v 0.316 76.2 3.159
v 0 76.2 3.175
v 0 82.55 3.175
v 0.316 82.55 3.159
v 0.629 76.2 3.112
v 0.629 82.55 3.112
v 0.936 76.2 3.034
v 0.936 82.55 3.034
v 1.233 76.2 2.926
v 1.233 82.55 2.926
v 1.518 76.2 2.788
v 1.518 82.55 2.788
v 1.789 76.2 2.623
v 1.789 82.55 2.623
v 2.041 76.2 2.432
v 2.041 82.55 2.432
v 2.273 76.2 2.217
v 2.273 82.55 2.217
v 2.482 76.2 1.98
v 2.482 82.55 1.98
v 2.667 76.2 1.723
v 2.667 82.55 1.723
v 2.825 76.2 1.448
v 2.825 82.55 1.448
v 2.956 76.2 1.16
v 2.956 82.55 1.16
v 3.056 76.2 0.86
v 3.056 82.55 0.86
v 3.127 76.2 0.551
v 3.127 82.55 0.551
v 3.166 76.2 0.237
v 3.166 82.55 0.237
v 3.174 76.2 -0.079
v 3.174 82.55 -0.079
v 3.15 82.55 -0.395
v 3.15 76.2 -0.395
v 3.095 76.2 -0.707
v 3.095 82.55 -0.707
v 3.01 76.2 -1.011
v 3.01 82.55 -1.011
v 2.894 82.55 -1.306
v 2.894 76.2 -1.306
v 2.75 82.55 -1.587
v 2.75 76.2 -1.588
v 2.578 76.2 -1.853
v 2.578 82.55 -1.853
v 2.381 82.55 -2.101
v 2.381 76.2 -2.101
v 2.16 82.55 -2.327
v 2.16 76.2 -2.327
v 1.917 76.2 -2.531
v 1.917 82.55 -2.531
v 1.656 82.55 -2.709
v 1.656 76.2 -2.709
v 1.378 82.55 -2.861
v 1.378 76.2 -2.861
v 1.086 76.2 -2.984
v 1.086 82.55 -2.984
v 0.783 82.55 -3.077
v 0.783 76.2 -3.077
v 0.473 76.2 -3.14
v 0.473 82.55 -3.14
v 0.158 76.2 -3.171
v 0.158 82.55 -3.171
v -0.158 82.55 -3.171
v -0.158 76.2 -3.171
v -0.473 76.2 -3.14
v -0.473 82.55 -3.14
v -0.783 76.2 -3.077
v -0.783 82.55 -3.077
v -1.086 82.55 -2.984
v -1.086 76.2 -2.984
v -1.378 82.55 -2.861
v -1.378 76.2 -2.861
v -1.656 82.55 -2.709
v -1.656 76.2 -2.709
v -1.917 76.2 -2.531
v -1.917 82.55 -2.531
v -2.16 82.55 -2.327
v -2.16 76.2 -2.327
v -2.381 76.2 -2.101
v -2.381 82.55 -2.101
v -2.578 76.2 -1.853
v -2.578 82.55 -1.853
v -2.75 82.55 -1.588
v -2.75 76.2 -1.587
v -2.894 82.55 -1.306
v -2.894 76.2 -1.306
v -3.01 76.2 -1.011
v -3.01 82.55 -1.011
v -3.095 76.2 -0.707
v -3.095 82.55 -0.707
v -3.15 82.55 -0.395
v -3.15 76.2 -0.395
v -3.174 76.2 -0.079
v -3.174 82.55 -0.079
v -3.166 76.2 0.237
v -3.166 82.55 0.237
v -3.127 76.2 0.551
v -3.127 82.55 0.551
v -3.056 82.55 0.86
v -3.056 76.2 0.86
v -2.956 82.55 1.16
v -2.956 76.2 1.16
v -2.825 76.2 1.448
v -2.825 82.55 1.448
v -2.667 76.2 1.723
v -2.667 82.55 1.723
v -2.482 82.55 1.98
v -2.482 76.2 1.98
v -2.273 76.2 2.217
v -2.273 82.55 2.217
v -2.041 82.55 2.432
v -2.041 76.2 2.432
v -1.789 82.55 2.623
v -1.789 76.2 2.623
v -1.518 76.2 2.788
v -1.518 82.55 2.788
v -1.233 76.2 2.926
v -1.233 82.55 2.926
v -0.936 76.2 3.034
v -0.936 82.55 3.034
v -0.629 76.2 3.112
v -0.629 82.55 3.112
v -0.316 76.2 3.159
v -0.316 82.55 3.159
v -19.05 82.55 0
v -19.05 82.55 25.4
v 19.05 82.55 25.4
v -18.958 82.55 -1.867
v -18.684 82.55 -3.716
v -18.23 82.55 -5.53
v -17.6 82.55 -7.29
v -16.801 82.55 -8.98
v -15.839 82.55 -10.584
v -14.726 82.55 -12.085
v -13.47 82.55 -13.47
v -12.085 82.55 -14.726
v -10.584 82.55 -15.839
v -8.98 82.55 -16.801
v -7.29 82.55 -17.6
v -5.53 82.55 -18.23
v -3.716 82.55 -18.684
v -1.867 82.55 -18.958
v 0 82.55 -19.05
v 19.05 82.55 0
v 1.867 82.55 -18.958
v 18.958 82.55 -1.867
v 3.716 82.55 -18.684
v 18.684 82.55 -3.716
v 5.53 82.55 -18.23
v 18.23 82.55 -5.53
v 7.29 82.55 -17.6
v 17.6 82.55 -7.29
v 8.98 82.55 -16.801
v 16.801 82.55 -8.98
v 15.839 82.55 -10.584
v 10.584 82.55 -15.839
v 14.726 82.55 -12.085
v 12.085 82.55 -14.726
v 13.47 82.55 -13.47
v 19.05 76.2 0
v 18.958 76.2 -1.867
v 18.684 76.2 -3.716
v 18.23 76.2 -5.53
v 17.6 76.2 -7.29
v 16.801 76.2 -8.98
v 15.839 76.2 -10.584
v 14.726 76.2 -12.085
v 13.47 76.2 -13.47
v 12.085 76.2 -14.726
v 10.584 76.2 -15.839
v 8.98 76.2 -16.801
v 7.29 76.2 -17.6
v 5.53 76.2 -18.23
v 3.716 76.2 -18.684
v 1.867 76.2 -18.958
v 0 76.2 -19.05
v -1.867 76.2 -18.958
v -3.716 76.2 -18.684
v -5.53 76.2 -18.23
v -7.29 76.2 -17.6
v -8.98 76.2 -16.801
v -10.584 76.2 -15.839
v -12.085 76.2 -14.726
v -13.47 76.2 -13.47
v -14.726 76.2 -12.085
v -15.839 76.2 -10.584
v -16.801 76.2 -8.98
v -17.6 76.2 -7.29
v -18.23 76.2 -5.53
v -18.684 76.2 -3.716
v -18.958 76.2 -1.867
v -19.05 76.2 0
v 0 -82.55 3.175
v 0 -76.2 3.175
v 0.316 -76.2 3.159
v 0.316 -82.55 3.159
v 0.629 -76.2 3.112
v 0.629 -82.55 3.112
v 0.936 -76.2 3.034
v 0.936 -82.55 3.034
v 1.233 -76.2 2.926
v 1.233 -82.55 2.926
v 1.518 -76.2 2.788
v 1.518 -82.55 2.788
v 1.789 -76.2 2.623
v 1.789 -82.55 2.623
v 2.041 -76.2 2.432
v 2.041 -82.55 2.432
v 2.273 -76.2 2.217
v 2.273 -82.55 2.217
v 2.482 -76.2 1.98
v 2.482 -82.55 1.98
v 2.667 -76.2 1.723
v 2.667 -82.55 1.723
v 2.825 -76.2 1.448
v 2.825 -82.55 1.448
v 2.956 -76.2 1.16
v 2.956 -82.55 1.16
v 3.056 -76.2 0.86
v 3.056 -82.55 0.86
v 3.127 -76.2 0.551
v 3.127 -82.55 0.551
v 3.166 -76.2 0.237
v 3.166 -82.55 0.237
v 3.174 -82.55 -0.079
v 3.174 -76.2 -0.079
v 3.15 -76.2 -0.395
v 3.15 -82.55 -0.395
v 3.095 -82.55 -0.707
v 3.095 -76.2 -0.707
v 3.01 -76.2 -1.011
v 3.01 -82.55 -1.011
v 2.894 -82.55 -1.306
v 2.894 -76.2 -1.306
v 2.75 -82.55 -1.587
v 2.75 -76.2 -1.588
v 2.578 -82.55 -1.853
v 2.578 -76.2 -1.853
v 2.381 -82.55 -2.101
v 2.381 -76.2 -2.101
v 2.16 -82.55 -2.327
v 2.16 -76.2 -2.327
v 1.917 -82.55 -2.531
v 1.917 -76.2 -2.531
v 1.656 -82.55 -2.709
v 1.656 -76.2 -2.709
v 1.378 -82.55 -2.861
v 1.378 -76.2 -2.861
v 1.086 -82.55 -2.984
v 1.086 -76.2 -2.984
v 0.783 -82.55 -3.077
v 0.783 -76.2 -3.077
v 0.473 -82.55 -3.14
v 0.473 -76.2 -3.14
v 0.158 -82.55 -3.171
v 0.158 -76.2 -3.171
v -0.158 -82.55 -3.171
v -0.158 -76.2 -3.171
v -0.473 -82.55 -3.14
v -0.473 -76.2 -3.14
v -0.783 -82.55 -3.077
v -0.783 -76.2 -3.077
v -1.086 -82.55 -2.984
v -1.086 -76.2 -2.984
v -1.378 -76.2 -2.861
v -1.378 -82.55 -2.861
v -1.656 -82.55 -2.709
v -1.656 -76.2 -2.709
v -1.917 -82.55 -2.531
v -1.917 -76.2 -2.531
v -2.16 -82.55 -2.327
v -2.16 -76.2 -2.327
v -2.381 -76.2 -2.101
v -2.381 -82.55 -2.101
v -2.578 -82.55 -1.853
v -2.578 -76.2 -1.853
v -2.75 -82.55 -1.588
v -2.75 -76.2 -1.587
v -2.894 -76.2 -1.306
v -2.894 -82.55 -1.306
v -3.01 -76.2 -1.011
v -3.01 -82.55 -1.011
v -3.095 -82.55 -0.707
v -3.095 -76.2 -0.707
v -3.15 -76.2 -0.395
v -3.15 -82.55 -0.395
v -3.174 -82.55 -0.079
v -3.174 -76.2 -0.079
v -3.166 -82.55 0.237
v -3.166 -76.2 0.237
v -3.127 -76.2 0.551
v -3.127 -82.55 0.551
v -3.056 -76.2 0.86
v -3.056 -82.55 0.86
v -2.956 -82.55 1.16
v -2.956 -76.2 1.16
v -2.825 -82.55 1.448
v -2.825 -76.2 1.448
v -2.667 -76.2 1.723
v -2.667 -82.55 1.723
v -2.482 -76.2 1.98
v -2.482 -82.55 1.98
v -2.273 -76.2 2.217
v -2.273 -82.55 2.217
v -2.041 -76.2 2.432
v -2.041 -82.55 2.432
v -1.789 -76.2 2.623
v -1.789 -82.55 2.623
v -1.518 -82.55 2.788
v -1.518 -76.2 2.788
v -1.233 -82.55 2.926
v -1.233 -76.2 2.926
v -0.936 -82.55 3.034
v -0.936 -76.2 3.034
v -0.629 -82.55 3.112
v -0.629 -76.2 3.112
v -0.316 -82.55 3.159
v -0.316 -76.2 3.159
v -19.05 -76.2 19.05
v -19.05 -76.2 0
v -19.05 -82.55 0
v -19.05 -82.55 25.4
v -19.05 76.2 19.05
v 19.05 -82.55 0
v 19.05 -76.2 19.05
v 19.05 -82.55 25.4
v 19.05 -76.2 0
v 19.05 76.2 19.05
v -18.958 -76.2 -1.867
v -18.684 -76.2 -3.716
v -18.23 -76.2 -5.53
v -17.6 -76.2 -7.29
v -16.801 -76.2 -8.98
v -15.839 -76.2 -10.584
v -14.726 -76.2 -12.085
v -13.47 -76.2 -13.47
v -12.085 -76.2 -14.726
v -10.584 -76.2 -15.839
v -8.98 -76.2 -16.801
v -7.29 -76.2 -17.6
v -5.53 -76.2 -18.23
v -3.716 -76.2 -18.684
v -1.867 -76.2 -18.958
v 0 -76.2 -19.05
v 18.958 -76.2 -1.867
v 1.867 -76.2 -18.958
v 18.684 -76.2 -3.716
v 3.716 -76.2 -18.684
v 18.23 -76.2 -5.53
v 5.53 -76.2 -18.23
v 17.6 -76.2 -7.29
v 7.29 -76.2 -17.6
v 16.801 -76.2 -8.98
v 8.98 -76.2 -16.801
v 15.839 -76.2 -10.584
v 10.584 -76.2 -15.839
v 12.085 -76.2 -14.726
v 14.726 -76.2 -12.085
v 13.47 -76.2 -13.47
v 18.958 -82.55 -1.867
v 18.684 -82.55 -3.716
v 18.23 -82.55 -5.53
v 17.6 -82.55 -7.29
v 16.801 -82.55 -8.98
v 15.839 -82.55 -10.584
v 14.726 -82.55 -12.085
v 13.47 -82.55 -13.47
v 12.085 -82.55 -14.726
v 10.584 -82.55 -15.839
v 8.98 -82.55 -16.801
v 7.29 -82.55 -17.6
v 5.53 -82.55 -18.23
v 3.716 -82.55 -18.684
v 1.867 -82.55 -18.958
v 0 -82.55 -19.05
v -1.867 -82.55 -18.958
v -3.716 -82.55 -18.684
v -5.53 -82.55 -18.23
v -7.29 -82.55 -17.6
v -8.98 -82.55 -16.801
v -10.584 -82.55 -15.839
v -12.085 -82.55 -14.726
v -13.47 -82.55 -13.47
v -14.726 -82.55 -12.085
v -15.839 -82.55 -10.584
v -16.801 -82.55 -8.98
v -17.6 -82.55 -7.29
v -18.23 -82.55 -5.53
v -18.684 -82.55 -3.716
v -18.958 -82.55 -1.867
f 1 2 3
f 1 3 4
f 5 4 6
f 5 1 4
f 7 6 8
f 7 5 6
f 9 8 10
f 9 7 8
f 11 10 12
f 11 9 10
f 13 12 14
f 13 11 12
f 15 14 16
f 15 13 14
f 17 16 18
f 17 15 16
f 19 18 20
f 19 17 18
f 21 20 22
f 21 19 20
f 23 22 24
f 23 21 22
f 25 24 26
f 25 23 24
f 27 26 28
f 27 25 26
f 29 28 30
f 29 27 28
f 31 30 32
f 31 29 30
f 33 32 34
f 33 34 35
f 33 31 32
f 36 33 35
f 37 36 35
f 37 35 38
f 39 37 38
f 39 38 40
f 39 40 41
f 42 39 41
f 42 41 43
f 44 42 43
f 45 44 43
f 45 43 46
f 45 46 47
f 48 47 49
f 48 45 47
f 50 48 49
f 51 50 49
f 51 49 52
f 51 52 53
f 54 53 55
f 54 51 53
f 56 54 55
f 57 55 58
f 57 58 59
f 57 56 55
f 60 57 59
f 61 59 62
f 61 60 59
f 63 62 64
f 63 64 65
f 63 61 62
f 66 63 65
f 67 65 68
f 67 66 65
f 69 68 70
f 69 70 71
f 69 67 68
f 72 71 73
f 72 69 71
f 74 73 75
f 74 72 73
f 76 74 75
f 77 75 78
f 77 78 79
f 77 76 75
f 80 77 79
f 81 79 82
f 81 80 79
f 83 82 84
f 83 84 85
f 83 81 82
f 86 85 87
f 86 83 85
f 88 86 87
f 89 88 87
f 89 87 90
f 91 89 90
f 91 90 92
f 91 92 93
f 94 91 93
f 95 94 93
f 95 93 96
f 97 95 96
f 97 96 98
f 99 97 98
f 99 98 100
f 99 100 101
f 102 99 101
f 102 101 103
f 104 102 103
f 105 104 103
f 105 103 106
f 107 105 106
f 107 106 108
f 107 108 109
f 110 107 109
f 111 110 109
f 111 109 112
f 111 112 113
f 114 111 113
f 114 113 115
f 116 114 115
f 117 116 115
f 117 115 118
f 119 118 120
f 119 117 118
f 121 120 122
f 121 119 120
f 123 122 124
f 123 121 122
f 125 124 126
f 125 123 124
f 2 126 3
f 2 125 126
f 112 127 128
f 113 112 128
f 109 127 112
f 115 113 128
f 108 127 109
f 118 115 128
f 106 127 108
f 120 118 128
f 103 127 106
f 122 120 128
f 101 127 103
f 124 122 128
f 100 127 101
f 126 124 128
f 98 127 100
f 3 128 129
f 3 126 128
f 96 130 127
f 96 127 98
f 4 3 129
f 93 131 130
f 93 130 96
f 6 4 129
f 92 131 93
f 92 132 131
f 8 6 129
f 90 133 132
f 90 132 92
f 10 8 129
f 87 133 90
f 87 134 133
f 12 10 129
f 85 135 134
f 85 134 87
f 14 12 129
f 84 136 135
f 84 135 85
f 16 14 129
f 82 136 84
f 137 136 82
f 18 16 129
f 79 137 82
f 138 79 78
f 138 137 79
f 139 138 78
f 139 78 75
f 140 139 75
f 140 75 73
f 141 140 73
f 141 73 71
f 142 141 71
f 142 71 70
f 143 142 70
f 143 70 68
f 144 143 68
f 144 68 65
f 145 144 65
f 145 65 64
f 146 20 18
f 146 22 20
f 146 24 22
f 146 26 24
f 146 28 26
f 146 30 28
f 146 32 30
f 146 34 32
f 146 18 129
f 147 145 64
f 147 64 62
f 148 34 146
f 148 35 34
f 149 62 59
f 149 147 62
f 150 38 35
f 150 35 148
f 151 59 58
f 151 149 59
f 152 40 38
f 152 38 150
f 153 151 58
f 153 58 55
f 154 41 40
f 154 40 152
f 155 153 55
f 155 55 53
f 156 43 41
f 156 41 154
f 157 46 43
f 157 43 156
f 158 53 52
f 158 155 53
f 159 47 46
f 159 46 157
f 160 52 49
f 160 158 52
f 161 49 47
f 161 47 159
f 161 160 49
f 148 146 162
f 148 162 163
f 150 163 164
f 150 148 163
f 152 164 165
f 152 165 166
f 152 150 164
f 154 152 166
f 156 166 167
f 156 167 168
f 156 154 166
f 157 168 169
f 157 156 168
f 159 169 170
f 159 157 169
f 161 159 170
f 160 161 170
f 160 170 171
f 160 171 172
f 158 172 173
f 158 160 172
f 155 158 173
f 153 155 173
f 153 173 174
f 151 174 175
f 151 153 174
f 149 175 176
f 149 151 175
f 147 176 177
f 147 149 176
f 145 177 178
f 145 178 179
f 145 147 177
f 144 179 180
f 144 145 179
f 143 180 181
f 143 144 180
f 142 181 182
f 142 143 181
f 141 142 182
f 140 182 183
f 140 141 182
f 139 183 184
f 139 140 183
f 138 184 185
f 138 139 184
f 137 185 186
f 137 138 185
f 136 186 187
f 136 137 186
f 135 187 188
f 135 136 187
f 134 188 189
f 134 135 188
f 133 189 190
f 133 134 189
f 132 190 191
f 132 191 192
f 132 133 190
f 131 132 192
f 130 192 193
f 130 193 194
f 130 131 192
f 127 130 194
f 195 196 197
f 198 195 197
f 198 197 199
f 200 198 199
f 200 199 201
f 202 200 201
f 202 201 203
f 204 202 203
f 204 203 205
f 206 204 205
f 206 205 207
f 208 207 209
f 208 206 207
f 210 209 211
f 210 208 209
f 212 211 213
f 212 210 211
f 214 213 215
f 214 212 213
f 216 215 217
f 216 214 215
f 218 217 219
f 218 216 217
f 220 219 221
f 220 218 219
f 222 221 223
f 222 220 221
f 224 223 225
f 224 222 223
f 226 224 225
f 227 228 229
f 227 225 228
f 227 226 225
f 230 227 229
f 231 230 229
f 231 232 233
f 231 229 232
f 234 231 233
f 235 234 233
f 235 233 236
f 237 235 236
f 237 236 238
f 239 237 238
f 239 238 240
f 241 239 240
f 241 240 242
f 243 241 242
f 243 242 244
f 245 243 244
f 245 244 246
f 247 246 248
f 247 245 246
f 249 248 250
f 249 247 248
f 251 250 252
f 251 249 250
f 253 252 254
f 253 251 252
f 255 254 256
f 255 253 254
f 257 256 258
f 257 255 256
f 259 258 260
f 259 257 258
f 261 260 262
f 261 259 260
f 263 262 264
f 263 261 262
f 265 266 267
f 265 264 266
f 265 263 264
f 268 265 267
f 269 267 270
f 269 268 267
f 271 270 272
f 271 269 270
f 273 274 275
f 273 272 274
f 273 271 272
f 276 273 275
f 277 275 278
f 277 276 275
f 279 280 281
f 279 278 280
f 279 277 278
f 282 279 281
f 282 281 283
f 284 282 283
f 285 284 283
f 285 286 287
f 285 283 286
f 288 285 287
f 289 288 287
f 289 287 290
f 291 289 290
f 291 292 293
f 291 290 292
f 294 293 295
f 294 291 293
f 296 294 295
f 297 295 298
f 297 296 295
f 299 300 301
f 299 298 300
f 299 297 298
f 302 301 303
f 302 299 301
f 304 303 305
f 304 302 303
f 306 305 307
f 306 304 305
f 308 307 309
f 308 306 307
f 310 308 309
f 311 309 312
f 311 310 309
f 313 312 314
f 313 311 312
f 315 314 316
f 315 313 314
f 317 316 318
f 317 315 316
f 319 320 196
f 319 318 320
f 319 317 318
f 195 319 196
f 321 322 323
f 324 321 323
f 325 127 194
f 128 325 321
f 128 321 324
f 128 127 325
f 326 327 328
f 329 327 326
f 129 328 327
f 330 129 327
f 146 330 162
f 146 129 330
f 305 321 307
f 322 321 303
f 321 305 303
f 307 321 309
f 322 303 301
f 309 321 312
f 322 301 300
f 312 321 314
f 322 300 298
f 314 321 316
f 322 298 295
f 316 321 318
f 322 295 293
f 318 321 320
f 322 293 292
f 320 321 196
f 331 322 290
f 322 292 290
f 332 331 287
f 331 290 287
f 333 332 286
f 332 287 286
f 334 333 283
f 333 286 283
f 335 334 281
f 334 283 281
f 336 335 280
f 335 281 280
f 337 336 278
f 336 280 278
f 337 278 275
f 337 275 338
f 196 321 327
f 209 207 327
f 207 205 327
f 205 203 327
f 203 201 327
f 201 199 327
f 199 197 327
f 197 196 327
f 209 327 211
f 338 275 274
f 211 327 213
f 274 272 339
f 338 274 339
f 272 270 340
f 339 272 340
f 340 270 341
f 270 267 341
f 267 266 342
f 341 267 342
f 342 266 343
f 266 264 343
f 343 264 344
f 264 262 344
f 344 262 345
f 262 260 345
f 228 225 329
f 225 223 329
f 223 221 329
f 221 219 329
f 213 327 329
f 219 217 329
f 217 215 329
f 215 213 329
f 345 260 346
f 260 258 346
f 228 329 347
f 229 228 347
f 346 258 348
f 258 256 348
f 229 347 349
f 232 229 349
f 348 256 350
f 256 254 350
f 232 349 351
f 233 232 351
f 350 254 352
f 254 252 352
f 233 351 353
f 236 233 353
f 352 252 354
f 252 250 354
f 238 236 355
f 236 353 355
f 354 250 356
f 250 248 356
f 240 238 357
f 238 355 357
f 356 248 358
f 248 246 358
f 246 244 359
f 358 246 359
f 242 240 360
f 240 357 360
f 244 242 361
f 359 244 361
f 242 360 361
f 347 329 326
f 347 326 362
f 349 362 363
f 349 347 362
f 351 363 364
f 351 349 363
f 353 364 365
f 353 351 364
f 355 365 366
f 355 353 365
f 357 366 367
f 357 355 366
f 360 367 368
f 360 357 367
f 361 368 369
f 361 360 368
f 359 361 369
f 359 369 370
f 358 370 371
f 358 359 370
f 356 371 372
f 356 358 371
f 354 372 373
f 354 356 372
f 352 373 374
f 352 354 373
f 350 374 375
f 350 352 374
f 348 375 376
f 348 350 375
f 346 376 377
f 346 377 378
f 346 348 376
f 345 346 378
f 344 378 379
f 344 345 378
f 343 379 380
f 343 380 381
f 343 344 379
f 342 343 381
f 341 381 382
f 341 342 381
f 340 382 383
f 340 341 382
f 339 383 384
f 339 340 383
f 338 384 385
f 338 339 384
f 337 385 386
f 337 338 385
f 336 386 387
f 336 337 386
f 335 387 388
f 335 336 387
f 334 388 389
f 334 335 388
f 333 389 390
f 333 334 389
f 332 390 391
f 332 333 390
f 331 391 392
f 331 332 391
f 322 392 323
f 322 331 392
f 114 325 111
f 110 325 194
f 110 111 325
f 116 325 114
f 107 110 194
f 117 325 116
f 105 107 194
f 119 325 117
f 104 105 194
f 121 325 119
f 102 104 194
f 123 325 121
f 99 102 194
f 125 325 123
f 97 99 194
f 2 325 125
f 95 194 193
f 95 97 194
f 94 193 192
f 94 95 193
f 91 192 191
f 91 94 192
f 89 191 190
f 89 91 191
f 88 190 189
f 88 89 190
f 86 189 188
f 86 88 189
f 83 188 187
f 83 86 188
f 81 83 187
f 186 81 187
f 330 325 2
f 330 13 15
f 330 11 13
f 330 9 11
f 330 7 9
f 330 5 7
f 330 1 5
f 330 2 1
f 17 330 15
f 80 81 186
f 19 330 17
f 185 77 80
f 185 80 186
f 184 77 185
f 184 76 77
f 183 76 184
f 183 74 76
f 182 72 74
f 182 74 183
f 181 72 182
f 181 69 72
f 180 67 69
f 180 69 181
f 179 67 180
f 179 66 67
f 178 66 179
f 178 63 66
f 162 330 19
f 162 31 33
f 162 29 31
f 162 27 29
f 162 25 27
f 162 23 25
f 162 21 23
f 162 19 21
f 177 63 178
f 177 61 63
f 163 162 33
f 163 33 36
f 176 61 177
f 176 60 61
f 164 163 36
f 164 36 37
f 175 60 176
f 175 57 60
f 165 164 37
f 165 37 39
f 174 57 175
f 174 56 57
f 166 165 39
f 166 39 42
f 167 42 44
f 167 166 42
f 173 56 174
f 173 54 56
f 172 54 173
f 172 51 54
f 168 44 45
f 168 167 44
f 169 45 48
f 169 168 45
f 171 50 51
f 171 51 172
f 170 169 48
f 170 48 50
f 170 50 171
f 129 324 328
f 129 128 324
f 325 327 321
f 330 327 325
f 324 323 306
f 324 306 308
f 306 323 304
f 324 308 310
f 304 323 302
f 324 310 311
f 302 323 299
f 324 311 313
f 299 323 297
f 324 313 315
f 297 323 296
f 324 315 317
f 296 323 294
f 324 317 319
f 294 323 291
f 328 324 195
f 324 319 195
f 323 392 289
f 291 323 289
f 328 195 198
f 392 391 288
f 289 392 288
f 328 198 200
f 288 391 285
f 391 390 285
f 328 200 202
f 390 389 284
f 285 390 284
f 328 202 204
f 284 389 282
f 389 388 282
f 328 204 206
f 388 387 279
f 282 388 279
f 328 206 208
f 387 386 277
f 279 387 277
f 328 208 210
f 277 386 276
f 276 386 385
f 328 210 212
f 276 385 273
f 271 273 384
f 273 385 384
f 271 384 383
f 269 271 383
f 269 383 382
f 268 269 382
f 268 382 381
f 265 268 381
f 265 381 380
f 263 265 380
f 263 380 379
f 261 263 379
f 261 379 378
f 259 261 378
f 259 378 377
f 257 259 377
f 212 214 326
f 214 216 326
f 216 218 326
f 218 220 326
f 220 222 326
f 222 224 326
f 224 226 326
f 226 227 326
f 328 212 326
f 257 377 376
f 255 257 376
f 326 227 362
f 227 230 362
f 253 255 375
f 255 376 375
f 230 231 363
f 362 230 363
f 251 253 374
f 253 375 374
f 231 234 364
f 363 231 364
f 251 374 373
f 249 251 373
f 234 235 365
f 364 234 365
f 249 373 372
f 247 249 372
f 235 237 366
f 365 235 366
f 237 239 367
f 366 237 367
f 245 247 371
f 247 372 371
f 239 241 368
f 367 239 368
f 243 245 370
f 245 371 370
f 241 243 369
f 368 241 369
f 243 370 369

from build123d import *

# Parameters (mm, degrees)
SKETCH1_R      = 3.175
EXTRUDE1_DEPTH = 82.55
SKETCH2_W      = 38.1
SKETCH2_H      = 152.4
EXTRUDE2_DEPTH = 39.1


with BuildPart() as part:
    # Sketch1 → Extrude1 (new body, symmetric)
    with BuildSketch(Plane(origin=(0, 0, 0), x_dir=(1, 0, 0), z_dir=(0, 1, 0))):
        with BuildLine():
            Line((-19.05, -25.4), (19.05, -25.4))
            Line((19.05, -25.4), (19.05, 0))
            ThreePointArc((19.05, 0), (0, 19.05), (-19.05, 0))
            Line((-19.05, 0), (-19.05, -25.4))
        make_face()
        with Locations(Location((0, 0, 0), (0, 0, 270))):  # turned: the seam where the file's is
            Circle(SKETCH1_R, mode=Mode.SUBTRACT)
    extrude(amount=EXTRUDE1_DEPTH, both=True)

    # Sketch2 → Extrude2 (cut, through all)
    with BuildSketch(Plane(origin=(19.05, 0, 0), x_dir=(0, 0, -1), z_dir=(1, 0, 0))):
        Rectangle(SKETCH2_W, SKETCH2_H)
    extrude(amount=-EXTRUDE2_DEPTH, mode=Mode.SUBTRACT)


solid = part.part
